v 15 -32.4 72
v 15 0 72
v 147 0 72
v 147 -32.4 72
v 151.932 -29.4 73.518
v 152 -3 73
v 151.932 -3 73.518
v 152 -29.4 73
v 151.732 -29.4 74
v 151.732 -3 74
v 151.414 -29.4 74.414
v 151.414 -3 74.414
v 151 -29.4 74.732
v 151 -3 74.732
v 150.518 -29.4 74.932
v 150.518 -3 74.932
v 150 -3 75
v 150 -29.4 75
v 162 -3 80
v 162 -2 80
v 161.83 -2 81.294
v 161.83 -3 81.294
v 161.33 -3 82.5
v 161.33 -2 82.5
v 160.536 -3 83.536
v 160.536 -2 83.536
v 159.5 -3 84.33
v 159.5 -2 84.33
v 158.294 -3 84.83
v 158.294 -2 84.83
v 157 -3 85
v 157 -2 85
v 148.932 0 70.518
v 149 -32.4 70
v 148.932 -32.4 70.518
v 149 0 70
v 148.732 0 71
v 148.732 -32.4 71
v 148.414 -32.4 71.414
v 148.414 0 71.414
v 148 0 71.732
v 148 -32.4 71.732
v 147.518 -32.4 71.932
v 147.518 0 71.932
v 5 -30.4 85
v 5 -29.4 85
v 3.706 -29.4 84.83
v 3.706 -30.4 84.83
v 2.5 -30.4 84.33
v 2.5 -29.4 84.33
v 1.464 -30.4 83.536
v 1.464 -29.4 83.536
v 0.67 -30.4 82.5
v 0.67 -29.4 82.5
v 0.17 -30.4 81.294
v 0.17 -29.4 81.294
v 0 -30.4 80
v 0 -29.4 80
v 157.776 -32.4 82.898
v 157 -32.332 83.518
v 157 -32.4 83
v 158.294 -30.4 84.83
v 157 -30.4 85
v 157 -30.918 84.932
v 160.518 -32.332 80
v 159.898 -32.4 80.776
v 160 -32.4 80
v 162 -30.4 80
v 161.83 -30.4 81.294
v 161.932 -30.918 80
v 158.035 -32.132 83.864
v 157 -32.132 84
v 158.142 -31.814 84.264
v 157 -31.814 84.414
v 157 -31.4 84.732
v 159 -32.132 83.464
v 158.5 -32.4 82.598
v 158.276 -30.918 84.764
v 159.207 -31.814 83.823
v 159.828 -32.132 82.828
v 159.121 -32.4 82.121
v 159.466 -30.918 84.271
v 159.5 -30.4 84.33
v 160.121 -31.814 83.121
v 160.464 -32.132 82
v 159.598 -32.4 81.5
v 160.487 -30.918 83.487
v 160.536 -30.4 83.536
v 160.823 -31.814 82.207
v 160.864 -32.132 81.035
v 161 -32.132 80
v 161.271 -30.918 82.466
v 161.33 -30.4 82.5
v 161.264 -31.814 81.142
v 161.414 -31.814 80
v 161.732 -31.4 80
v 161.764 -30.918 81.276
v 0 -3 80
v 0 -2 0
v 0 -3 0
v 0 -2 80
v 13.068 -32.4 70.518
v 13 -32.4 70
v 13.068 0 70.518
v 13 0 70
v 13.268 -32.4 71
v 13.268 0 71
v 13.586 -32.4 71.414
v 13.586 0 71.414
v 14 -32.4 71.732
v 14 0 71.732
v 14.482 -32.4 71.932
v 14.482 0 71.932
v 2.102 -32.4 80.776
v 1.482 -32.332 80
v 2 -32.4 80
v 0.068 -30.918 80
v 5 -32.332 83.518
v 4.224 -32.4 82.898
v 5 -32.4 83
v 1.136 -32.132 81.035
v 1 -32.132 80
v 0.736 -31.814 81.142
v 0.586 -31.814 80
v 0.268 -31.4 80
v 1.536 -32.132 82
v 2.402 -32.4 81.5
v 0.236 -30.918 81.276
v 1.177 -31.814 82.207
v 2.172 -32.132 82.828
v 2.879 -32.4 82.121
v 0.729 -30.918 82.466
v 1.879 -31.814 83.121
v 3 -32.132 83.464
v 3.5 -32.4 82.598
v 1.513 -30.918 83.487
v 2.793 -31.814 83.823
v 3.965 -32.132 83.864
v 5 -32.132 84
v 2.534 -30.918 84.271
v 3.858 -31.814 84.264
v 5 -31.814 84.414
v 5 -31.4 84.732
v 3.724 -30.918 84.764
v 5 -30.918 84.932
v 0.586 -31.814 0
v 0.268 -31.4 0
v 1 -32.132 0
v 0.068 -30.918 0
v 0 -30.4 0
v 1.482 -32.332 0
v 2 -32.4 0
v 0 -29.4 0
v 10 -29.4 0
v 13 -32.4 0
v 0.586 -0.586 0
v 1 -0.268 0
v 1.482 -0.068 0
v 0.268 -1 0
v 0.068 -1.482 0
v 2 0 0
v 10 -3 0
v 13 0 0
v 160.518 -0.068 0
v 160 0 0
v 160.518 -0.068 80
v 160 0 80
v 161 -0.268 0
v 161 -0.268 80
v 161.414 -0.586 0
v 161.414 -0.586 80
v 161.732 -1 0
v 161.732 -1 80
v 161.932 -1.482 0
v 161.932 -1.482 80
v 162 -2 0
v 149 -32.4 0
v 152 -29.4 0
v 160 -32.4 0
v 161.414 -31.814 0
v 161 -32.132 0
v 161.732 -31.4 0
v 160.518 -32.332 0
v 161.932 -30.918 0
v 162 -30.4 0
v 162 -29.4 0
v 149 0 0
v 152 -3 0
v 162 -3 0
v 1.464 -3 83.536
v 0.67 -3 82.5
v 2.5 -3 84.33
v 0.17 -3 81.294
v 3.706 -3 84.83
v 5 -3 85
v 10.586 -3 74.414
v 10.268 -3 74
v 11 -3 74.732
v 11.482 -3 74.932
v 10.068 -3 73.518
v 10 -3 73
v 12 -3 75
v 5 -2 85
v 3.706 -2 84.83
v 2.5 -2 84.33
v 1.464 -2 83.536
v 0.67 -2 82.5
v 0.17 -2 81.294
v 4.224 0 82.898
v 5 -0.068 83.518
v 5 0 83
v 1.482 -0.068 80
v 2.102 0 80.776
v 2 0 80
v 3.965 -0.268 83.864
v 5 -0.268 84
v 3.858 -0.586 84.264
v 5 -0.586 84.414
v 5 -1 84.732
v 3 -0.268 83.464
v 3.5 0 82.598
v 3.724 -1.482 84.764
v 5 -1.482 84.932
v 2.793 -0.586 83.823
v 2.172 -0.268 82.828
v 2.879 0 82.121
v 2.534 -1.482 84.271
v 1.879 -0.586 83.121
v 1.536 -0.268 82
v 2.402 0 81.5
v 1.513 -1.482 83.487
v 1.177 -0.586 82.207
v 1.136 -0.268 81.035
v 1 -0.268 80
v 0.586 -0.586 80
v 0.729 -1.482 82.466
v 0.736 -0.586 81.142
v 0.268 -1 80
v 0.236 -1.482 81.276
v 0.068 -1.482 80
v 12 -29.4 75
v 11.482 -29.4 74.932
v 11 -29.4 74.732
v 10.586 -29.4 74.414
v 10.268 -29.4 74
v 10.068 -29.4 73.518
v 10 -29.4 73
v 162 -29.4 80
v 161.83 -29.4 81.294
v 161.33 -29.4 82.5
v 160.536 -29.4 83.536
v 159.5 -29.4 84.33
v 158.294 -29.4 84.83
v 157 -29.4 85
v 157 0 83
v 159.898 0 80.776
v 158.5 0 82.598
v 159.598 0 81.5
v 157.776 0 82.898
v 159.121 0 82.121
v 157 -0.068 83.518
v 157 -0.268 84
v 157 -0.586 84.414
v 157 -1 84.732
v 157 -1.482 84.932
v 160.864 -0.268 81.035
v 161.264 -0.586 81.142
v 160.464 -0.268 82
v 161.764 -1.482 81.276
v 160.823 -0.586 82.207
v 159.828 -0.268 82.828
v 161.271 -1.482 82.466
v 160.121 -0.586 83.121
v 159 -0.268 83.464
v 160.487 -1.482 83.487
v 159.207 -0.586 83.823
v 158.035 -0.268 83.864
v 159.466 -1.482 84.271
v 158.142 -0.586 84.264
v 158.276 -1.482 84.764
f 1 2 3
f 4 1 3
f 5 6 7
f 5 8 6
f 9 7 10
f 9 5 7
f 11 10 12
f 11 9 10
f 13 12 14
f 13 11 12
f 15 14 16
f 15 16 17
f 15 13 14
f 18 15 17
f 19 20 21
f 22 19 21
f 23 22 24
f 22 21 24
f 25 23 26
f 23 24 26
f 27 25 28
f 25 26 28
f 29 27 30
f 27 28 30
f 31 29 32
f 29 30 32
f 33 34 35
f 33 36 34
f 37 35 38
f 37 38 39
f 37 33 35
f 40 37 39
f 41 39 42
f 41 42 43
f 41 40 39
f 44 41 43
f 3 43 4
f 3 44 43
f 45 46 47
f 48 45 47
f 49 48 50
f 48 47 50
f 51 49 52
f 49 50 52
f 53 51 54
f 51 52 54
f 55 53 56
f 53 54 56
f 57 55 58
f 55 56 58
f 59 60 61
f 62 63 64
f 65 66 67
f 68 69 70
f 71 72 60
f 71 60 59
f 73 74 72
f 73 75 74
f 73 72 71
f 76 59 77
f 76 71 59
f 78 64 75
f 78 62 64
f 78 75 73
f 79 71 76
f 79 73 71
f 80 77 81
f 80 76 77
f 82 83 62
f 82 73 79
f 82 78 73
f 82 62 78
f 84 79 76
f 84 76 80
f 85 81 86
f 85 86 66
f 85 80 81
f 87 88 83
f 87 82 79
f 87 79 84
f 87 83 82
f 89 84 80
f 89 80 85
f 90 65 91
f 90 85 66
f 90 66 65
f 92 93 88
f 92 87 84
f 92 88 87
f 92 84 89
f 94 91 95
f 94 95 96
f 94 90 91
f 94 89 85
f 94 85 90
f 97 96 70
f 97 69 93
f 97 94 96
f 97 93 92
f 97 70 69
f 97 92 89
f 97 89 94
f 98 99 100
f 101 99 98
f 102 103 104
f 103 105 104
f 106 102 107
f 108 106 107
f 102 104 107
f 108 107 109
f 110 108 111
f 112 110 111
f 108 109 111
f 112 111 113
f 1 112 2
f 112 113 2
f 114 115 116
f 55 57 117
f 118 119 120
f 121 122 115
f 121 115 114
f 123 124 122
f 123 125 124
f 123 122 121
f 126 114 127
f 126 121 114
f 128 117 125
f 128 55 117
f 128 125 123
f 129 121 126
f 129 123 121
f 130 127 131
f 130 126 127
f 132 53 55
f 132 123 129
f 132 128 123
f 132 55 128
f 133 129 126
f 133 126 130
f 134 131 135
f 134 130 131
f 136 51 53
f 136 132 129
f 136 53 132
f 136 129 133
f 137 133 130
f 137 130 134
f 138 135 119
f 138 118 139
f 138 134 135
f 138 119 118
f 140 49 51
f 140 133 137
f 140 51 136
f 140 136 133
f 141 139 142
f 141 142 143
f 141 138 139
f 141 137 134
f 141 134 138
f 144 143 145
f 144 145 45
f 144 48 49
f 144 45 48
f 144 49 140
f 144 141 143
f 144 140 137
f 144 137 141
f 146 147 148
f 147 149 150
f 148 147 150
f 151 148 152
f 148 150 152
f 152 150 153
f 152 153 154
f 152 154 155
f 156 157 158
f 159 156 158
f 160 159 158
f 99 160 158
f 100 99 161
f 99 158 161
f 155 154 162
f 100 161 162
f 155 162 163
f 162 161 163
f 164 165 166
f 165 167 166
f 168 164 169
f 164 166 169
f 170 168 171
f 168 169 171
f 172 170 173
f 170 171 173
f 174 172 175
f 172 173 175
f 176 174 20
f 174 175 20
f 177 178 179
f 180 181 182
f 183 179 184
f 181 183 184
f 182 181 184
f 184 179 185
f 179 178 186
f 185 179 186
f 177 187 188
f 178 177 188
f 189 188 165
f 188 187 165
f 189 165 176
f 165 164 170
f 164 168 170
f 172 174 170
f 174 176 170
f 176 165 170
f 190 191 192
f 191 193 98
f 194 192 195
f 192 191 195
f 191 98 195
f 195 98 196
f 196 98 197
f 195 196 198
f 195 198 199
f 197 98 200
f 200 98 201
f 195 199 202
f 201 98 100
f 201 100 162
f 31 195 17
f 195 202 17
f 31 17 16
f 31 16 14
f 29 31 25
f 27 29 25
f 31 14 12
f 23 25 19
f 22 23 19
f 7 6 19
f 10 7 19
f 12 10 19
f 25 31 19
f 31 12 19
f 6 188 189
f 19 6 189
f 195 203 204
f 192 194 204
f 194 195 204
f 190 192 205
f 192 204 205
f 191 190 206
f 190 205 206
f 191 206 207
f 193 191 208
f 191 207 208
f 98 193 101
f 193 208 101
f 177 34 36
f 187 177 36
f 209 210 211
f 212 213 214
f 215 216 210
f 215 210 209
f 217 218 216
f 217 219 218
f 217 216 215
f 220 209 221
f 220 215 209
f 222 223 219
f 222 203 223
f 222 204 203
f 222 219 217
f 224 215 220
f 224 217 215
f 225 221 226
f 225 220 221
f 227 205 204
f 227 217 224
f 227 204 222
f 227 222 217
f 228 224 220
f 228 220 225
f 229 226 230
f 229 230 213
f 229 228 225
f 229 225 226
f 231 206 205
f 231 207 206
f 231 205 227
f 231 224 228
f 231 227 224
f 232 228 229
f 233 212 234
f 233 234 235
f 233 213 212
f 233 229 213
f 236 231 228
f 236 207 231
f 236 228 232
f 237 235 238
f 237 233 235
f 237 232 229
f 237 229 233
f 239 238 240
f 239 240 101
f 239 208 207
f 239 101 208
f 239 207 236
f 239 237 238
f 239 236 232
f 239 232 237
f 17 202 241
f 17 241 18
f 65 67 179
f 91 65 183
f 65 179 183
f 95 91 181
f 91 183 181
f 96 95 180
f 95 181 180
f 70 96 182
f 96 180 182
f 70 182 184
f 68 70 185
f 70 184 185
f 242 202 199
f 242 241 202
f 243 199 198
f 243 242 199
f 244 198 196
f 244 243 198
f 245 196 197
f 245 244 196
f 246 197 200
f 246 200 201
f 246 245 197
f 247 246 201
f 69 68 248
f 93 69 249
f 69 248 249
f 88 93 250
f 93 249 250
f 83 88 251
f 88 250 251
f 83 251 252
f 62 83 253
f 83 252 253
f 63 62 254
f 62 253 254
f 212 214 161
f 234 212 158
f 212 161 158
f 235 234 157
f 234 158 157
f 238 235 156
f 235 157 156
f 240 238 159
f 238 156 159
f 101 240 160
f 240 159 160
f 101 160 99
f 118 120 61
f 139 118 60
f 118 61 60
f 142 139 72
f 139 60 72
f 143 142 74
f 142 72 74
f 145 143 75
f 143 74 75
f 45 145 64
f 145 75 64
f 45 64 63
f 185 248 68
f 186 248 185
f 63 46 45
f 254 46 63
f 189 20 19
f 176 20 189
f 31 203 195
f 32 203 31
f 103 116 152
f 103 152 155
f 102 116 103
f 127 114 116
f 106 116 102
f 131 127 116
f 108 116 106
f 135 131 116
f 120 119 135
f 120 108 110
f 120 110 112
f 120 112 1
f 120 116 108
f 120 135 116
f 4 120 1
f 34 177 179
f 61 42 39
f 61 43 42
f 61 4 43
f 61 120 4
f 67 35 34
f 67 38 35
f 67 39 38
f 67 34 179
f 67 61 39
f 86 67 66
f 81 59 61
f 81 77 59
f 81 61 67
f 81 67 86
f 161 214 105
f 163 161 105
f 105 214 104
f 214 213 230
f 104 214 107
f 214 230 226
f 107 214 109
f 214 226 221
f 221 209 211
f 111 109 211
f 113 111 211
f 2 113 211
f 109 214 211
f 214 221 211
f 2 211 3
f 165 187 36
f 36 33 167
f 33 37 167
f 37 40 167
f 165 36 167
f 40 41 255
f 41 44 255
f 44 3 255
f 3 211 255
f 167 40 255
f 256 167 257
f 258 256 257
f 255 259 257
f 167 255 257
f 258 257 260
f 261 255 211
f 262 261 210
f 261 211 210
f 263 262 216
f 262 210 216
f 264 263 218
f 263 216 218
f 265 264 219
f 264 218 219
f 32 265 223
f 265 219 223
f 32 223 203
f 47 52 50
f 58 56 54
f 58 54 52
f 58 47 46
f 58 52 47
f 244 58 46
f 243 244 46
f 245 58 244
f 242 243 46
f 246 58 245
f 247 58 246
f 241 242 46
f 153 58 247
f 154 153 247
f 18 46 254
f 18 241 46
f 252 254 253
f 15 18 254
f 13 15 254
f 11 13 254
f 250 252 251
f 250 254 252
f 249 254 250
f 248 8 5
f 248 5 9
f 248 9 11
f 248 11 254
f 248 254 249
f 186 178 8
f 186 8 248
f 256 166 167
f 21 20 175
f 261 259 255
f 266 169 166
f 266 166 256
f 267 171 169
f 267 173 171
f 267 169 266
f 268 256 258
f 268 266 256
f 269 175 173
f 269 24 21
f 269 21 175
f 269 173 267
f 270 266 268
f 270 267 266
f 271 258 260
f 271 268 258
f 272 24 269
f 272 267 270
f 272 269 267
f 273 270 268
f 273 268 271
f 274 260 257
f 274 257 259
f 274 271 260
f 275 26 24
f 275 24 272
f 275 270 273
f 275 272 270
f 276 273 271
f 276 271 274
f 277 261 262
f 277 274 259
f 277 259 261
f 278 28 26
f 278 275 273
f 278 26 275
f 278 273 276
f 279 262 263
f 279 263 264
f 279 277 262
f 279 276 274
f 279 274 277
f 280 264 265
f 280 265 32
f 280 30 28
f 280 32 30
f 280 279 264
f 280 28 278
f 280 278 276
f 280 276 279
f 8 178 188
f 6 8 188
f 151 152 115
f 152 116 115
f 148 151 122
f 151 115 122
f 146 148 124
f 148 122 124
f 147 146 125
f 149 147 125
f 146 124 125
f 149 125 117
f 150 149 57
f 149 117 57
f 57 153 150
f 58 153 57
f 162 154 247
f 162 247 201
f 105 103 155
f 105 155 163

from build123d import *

# Parameters (mm, degrees)
BOX003_W     = 136
BOX003_H     = 40
BOX003_DEPTH = 85
BOX002_W     = 20
BOX002_H     = 26.4
BOX002_DEPTH = 100
BOX001_W     = 20
BOX001_H     = 26.4
BOX001_DEPTH = 92
BOX_W        = 170
BOX_H        = 26.4
BOX_DEPTH    = 20
PAD_DEPTH    = 32.4
FILLET_R     = 2
FILLET001_R  = 2
FILLET002_R  = 2
FILLET003_R  = 2
FILLET004_R  = 2


with BuildPart() as cubedessous:
    # Box003 → Box003 (new body)
    with BuildSketch(Plane(origin=(13, -36, -13), x_dir=(1, 0, 0), z_dir=(0, 0, 1))):
        with Locations((68, 20)):
            Rectangle(BOX003_W, BOX003_H)
    extrude(amount=BOX003_DEPTH)


with BuildPart() as cubedroite:
    # Box002 → Box002 (new body)
    with BuildSketch(Plane(origin=(152, -29.4, -11), x_dir=(1, 0, 0), z_dir=(0, 0, 1))):
        with Locations((10, 13.2)):
            Rectangle(BOX002_W, BOX002_H)
    extrude(amount=BOX002_DEPTH)


with BuildPart() as cubegauche:
    # Box001 → Box001 (new body)
    with BuildSketch(Plane(origin=(-10, -29.4, -4), x_dir=(1, 0, 0), z_dir=(0, 0, 1))):
        with Locations((10, 13.2)):
            Rectangle(BOX001_W, BOX001_H)
    extrude(amount=BOX001_DEPTH)


with BuildPart() as cubedessus:
    # Box → Box (new body)
    with BuildSketch(Plane(origin=(-4, -29.4, 75), x_dir=(1, 0, 0), z_dir=(0, 0, 1))):
        with Locations((85, 13.2)):
            Rectangle(BOX_W, BOX_H)
    extrude(amount=BOX_DEPTH)


with BuildPart() as fillet004:
    # Sketch → Pad (new body)
    with BuildSketch(Plane.XZ):
        with BuildLine():
            ThreePointArc((5, 85), (1.464466, 83.535534), (0, 80))
            Line((0, 0), (0, 80))
            Line((0, 0), (162, 0))
            Line((162, 80), (162, 0))
            ThreePointArc((162, 80), (160.535534, 83.535534), (157, 85))
            Line((5, 85), (157, 85))
        make_face()
    extrude(amount=PAD_DEPTH)

    # Cut: cut CubeDessus
    add(cubedessus.part, mode=Mode.SUBTRACT)

    # Cut001: cut CubeGauche
    add(cubegauche.part, mode=Mode.SUBTRACT)

    # Cut002: cut CubeDroite
    add(cubedroite.part, mode=Mode.SUBTRACT)

    # Cut003: cut CubeDessous
    add(cubedessous.part, mode=Mode.SUBTRACT)

    # Fillet
    fillet_edges = [fillet004.edges().sort_by_distance(p)[0] for p in [
        (152, -16.2, 75),
    ]]
    fillet(fillet_edges, radius=FILLET_R)

    # Fillet001
    fillet001_edges = [fillet004.edges().sort_by_distance(p)[0] for p in [
        (10, -16.2, 75),
    ]]
    fillet(fillet001_edges, radius=FILLET001_R)

    # Fillet002
    fillet002_edges = [fillet004.edges().sort_by_distance(p)[0] for p in [
        (81, -32.4, 85),
        (1.464466, -32.4, 83.535534),
        (0, -32.4, 40),
        (162, -32.4, 40),
        (160.535534, -32.4, 83.535534),
    ]]
    fillet(fillet002_edges, radius=FILLET002_R)

    # Fillet003
    fillet003_edges = [fillet004.edges().sort_by_distance(p)[0] for p in [
        (1.464466, 0, 83.535534),
        (0, 0, 40),
        (162, 0, 40),
        (160.535534, 0, 83.535534),
        (81, 0, 85),
    ]]
    fillet(fillet003_edges, radius=FILLET003_R)

    # Fillet004
    fillet004_edges = [fillet004.edges().sort_by_distance(p)[0] for p in [
        (13, -16.2, 72),
        (149, -16.2, 72),
    ]]
    fillet(fillet004_edges, radius=FILLET004_R)


solid = fillet004.part
